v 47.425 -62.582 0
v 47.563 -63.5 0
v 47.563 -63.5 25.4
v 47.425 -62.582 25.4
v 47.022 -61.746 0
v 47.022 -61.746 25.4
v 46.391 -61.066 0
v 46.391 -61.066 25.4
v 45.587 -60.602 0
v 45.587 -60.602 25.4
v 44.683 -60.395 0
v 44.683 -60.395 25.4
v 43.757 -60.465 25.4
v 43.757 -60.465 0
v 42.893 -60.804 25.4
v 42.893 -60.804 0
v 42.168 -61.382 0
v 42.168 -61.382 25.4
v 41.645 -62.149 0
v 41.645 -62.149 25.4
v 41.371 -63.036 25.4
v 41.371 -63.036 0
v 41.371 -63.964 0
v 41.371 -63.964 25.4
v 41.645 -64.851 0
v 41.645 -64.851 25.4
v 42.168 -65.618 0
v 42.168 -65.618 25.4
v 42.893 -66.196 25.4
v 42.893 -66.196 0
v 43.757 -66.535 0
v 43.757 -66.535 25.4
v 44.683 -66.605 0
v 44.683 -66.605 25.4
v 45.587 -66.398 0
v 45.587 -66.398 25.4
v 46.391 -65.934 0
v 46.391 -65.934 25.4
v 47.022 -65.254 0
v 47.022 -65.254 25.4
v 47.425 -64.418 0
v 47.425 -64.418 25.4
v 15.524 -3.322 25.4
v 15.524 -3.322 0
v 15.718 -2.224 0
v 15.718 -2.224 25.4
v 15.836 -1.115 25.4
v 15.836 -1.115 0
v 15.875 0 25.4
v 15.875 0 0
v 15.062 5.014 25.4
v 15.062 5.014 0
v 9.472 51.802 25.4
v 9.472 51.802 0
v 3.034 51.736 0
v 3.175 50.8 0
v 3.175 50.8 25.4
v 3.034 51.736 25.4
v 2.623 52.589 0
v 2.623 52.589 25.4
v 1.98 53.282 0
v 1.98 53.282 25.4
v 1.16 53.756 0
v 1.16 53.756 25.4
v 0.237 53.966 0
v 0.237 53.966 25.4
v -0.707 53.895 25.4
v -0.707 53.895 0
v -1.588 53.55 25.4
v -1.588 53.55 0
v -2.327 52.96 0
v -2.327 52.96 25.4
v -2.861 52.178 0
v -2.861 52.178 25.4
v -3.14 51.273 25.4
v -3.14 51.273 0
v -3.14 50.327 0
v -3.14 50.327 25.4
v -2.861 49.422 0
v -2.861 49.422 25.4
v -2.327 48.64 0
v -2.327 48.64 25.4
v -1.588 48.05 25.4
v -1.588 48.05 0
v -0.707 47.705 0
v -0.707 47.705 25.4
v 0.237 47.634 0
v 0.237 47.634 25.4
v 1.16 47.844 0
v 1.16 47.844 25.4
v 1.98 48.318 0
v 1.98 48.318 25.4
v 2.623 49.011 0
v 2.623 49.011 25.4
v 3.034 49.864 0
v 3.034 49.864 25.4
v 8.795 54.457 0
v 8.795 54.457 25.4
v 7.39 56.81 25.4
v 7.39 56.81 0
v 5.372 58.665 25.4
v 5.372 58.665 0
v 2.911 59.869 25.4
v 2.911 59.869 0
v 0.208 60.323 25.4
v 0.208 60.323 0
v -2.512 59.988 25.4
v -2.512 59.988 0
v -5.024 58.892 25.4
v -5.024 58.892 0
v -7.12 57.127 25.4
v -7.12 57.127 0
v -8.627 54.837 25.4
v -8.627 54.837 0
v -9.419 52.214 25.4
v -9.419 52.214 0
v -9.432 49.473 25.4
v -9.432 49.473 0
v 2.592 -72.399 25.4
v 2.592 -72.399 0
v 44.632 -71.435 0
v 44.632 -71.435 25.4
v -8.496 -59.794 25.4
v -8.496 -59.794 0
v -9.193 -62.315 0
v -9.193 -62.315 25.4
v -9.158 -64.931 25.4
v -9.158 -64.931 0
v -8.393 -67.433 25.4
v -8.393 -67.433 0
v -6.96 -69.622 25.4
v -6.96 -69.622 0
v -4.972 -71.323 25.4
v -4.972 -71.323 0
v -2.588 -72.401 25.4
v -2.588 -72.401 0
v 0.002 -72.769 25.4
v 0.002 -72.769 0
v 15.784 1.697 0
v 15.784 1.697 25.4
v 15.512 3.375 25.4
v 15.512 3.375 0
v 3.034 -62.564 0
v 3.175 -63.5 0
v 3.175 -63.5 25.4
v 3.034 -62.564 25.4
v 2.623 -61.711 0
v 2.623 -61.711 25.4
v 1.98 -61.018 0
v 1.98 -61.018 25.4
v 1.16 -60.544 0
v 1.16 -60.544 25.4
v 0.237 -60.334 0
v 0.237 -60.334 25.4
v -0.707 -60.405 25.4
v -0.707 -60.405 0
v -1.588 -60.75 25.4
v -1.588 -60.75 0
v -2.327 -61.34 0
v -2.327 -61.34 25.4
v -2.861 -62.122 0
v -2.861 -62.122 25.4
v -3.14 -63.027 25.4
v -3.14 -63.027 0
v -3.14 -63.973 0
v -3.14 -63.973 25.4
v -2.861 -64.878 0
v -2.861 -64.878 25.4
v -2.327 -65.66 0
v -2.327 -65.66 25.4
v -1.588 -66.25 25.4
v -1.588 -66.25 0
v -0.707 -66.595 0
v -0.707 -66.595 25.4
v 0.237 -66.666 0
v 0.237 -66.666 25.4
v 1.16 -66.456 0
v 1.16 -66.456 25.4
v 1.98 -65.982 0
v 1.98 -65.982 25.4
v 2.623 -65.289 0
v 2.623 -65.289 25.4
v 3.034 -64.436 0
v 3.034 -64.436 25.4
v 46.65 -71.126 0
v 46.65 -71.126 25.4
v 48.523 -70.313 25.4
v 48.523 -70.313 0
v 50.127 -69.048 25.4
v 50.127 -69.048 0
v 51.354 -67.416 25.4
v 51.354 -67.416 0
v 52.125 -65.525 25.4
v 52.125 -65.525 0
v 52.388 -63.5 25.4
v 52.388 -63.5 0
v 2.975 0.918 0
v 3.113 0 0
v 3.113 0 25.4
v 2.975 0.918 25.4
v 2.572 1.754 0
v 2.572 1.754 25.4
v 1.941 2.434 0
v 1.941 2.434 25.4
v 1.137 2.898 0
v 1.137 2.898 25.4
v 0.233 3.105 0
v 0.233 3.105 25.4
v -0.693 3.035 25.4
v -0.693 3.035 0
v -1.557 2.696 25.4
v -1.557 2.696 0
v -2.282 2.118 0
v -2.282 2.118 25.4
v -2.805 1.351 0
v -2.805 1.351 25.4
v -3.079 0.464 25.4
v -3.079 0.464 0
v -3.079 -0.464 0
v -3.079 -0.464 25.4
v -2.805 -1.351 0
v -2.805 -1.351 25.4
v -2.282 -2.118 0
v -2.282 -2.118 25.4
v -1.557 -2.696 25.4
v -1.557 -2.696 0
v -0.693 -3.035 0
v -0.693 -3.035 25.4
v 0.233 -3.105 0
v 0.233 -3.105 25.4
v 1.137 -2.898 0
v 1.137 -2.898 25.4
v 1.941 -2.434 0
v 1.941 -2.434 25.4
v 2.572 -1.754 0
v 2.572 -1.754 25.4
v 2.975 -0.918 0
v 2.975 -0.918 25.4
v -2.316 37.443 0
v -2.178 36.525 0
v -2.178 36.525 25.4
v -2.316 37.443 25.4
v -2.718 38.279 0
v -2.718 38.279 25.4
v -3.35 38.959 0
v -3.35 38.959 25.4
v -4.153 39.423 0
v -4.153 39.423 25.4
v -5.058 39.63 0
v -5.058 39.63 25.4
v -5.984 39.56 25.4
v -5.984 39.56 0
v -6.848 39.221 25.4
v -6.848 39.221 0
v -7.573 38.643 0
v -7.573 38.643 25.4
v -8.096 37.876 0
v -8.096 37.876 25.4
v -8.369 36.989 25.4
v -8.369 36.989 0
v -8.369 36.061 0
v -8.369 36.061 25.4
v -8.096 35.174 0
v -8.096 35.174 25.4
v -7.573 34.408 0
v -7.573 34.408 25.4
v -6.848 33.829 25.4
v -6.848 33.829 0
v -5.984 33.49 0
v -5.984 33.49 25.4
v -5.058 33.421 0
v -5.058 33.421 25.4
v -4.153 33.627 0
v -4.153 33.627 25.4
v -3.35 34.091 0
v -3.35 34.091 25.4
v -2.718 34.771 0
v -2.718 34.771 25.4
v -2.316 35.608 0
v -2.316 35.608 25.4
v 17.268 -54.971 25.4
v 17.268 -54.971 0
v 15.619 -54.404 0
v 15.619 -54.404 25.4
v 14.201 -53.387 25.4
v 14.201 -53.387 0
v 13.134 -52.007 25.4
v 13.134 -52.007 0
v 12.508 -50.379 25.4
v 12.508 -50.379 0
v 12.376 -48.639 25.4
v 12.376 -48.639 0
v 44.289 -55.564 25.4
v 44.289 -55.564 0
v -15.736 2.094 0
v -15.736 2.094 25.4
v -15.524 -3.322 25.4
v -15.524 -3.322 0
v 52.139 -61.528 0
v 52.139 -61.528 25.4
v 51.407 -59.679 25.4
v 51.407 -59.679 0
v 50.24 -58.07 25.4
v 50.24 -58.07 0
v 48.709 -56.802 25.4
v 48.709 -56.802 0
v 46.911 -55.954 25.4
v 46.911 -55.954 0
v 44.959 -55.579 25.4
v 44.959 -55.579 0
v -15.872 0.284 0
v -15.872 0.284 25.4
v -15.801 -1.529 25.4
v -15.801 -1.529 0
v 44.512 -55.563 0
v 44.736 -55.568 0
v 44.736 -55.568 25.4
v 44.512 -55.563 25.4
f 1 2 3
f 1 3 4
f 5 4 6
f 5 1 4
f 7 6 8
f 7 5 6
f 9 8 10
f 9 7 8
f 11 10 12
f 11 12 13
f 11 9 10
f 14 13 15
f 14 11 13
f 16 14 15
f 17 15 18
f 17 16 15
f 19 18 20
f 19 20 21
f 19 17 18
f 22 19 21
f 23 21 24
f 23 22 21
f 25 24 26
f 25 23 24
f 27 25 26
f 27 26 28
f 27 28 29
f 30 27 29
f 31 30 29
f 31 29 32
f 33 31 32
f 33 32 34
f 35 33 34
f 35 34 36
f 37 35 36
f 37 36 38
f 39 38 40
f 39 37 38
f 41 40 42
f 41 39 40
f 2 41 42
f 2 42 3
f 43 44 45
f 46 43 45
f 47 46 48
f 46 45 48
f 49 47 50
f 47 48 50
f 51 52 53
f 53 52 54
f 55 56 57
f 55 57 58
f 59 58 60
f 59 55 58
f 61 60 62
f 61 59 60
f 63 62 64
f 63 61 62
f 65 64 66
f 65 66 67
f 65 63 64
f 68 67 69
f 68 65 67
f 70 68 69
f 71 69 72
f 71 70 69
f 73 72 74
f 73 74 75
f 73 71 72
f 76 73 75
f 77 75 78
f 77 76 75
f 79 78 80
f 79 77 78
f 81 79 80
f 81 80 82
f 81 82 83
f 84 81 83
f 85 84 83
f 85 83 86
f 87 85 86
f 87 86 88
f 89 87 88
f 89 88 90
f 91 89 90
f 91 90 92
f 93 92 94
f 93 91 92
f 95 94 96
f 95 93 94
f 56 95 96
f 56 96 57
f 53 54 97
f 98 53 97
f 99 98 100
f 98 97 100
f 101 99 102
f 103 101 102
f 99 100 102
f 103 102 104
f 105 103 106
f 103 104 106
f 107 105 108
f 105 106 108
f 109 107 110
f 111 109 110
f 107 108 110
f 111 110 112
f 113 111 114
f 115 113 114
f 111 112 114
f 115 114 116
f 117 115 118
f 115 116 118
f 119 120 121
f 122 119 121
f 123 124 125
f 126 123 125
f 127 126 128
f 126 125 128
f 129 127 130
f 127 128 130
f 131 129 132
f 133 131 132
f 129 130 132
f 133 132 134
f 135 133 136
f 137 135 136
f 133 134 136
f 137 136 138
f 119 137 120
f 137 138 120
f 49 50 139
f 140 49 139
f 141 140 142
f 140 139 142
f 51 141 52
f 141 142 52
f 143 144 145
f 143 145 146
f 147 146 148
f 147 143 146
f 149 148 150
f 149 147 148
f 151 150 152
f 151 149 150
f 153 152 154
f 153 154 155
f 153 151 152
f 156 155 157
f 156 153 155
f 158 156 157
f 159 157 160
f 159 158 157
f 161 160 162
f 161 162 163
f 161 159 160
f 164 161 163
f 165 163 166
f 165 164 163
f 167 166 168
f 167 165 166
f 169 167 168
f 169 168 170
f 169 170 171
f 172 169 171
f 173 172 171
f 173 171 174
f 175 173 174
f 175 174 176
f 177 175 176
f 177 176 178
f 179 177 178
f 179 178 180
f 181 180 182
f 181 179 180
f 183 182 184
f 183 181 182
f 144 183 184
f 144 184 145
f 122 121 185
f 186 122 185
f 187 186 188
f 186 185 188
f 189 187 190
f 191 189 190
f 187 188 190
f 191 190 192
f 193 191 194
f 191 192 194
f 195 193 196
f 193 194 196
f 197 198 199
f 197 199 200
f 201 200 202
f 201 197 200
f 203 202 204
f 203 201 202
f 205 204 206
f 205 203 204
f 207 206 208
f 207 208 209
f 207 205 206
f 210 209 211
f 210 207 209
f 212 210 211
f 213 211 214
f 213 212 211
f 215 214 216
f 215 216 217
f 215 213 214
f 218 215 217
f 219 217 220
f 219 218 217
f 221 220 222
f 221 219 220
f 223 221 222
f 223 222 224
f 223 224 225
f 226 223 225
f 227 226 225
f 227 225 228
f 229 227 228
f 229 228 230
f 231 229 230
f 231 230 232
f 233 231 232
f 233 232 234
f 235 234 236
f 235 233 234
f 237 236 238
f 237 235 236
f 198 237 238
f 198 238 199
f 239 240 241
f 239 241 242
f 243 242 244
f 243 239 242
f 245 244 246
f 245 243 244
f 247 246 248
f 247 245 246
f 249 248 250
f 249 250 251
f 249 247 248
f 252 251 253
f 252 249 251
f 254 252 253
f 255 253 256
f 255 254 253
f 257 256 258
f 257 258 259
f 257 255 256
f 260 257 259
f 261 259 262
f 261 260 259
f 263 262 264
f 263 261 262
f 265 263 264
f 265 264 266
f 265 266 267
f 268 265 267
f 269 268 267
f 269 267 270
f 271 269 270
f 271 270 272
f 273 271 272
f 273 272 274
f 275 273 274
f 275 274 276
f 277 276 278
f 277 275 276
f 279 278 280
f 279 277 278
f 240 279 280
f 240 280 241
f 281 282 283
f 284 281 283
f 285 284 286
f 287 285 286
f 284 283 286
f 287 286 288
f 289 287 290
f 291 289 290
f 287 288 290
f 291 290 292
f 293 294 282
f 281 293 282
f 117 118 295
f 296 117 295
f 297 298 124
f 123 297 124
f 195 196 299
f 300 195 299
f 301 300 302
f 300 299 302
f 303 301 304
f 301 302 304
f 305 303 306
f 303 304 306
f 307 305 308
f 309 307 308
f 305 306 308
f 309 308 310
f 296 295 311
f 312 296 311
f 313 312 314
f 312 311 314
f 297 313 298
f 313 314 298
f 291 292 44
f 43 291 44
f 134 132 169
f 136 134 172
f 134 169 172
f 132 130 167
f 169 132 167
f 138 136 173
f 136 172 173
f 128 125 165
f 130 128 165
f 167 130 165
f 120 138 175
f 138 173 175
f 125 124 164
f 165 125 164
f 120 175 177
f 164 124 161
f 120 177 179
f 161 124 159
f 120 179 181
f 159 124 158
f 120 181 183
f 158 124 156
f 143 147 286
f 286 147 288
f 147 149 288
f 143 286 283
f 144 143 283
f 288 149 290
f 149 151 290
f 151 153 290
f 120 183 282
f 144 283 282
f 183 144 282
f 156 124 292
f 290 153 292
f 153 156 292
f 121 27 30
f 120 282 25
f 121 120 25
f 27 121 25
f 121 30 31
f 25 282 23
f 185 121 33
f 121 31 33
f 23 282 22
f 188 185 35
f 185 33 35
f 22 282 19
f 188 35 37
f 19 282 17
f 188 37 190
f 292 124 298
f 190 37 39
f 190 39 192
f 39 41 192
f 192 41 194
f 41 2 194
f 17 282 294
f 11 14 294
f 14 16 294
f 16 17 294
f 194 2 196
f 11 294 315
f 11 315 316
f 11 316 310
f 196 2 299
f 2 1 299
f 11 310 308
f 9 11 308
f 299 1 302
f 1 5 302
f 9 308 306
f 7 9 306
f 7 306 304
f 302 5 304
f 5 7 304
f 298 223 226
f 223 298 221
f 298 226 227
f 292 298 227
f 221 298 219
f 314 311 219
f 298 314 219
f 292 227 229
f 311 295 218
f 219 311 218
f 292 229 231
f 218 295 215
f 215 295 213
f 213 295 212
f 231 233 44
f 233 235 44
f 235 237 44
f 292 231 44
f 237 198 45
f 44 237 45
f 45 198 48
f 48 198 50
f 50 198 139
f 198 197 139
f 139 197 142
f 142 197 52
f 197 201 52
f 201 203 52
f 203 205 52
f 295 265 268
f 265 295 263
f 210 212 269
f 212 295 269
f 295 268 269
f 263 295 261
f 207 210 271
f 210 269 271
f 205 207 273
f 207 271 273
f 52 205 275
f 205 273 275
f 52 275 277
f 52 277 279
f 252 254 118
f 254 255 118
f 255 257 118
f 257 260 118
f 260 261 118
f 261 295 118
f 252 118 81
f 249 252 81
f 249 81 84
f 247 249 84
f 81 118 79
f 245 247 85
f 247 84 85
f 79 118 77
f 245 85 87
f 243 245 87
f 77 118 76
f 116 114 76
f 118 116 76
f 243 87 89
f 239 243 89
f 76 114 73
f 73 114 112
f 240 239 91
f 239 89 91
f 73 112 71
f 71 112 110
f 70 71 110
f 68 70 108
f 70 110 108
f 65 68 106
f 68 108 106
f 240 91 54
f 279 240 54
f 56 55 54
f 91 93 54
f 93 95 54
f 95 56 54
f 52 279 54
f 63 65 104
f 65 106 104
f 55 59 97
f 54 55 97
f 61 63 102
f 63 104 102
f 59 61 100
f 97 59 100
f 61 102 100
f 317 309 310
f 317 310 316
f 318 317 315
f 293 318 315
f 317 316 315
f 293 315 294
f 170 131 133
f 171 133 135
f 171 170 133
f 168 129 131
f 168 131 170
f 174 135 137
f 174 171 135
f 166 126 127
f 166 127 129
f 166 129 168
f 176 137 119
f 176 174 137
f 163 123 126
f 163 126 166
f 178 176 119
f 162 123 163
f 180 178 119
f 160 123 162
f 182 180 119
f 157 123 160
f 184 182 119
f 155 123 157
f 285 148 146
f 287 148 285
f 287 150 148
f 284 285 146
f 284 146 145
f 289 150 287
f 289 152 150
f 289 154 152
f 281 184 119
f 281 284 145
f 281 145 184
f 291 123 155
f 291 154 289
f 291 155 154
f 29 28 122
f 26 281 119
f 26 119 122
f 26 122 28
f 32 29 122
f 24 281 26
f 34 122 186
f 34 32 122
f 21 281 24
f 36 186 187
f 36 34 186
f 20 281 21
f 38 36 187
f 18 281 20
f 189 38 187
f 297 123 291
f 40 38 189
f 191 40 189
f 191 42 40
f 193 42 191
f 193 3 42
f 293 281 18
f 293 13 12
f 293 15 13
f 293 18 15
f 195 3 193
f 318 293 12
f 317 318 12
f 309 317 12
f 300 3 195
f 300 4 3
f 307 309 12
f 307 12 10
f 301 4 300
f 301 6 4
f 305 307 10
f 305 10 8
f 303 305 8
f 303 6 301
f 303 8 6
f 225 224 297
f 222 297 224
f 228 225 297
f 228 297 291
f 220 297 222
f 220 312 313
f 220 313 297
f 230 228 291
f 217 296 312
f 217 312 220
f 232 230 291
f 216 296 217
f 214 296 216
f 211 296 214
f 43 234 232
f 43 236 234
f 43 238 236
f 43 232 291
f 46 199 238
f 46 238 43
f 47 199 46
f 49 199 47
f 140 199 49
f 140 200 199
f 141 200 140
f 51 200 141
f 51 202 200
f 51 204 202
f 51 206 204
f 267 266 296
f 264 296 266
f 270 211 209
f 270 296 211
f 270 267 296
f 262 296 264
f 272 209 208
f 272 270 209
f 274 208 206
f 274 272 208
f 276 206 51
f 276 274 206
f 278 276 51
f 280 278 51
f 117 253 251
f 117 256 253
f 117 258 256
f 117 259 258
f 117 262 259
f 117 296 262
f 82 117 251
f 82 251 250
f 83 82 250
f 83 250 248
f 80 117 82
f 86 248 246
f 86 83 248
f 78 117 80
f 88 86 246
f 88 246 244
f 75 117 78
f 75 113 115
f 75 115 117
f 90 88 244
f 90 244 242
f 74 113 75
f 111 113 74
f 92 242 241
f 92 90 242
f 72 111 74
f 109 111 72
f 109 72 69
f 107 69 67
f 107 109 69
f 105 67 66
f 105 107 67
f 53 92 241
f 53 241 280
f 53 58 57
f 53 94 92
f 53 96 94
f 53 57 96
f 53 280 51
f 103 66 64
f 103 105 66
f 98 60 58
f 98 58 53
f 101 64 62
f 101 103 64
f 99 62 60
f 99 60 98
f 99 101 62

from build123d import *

# Parameters (mm, degrees)
F0_R     = 3.113344
F0_R_2   = 3.113341
F0_R_3   = 3.175
F0_R_4   = 3.113343
F1_DEPTH = 25.4


with BuildPart() as f1:
    # F0 (on Top) → F1 (new body)
    with BuildSketch(Plane.XY):
        with BuildLine():
            ThreePointArc((15.523532, -3.321986), (15.786888, -1.670264), (15.875, 0))
            ThreePointArc((15.875, 0), (15.670523, 2.539751), (15.062359, 5.014075))
            ThreePointArc((15.062359, 5.014075), (-1.498504, 15.804117), (-15.736312, 2.093829))
            ThreePointArc((-15.736312, 2.093829), (-15.862763, -0.623209), (-15.523539, -3.321951))
            ThreePointArc((-15.523539, -3.321951), (-1.8e-05, -15.875), (15.523532, -3.321986))
        make_face()
        Circle(F0_R, mode=Mode.SUBTRACT)
        with BuildLine():
            ThreePointArc((-15.736312, 2.093829), (-1.498504, 15.804117), (15.062359, 5.014075))
            Line((15.062359, 5.014075), (9.472198, 51.801542))
            ThreePointArc((9.472198, 51.801542), (9.51179, 51.301466), (9.525, 50.8))
            ThreePointArc((9.525, 50.8), (0.665006, 41.298243), (-9.432143, 49.473233))
            Line((-9.432143, 49.473233), (-15.736312, 2.093829))
        make_face()
        with Locations((-5.29085, 36.5252)):
            Circle(F0_R_2, mode=Mode.SUBTRACT)
        with BuildLine():
            Line((12.375646, -48.639175), (15.523532, -3.321986))
            ThreePointArc((15.523532, -3.321986), (-1.8e-05, -15.875), (-15.523539, -3.321951))
            Line((-15.523539, -3.321951), (-8.495912, -59.7936))
            ThreePointArc((-8.495912, -59.7936), (1.893103, -54.426187), (9.269192, -63.5))
            ThreePointArc((9.269192, -63.5), (7.414371, -69.062826), (2.592227, -72.399342))
            Line((2.592227, -72.399342), (44.631951, -71.435414))
            ThreePointArc((44.631951, -71.435414), (36.514353, -63.671517), (44.288918, -55.564135))
            Line((44.288918, -55.564135), (17.268347, -54.970898))
            ThreePointArc((17.268347, -54.970898), (13.617253, -52.735975), (12.375646, -48.639175))
        make_face()
        with BuildLine():
            ThreePointArc((9.525, 50.8), (9.51179, 51.301466), (9.472198, 51.801542))
            ThreePointArc((9.472198, 51.801542), (-1.164327, 60.253569), (-9.432143, 49.473233))
            ThreePointArc((-9.432143, 49.473233), (0.665006, 41.298243), (9.525, 50.8))
        make_face()
        with Locations((0, 50.8)):
            Circle(F0_R_3, mode=Mode.SUBTRACT)
        with BuildLine():
            ThreePointArc((9.269192, -63.5), (1.893103, -54.426187), (-8.495912, -59.7936))
            ThreePointArc((-8.495912, -59.7936), (-6.959853, -69.621958), (2.592227, -72.399342))
            ThreePointArc((2.592227, -72.399342), (7.414371, -69.062826), (9.269192, -63.5))
        make_face()
        with Locations((0, -63.5)):
            Circle(F0_R_3, mode=Mode.SUBTRACT)
        with BuildLine():
            Line((44.959223, -55.578851), (44.288918, -55.564135))
            ThreePointArc((44.288918, -55.564135), (36.514353, -63.671517), (44.631951, -71.435414))
            ThreePointArc((44.631951, -71.435414), (50.126625, -69.047958), (52.3875, -63.5))
            ThreePointArc((52.3875, -63.5), (50.239899, -58.070361), (44.959223, -55.578851))
        make_face()
        with Locations((44.45, -63.5)):
            Circle(F0_R_4, mode=Mode.SUBTRACT)
        with BuildLine():
            ThreePointArc((44.959223, -55.578851), (44.624226, -55.564412), (44.288918, -55.564135))
            Line((44.288918, -55.564135), (44.959223, -55.578851))
        make_face()
    extrude(amount=F1_DEPTH)


solid = f1.part
